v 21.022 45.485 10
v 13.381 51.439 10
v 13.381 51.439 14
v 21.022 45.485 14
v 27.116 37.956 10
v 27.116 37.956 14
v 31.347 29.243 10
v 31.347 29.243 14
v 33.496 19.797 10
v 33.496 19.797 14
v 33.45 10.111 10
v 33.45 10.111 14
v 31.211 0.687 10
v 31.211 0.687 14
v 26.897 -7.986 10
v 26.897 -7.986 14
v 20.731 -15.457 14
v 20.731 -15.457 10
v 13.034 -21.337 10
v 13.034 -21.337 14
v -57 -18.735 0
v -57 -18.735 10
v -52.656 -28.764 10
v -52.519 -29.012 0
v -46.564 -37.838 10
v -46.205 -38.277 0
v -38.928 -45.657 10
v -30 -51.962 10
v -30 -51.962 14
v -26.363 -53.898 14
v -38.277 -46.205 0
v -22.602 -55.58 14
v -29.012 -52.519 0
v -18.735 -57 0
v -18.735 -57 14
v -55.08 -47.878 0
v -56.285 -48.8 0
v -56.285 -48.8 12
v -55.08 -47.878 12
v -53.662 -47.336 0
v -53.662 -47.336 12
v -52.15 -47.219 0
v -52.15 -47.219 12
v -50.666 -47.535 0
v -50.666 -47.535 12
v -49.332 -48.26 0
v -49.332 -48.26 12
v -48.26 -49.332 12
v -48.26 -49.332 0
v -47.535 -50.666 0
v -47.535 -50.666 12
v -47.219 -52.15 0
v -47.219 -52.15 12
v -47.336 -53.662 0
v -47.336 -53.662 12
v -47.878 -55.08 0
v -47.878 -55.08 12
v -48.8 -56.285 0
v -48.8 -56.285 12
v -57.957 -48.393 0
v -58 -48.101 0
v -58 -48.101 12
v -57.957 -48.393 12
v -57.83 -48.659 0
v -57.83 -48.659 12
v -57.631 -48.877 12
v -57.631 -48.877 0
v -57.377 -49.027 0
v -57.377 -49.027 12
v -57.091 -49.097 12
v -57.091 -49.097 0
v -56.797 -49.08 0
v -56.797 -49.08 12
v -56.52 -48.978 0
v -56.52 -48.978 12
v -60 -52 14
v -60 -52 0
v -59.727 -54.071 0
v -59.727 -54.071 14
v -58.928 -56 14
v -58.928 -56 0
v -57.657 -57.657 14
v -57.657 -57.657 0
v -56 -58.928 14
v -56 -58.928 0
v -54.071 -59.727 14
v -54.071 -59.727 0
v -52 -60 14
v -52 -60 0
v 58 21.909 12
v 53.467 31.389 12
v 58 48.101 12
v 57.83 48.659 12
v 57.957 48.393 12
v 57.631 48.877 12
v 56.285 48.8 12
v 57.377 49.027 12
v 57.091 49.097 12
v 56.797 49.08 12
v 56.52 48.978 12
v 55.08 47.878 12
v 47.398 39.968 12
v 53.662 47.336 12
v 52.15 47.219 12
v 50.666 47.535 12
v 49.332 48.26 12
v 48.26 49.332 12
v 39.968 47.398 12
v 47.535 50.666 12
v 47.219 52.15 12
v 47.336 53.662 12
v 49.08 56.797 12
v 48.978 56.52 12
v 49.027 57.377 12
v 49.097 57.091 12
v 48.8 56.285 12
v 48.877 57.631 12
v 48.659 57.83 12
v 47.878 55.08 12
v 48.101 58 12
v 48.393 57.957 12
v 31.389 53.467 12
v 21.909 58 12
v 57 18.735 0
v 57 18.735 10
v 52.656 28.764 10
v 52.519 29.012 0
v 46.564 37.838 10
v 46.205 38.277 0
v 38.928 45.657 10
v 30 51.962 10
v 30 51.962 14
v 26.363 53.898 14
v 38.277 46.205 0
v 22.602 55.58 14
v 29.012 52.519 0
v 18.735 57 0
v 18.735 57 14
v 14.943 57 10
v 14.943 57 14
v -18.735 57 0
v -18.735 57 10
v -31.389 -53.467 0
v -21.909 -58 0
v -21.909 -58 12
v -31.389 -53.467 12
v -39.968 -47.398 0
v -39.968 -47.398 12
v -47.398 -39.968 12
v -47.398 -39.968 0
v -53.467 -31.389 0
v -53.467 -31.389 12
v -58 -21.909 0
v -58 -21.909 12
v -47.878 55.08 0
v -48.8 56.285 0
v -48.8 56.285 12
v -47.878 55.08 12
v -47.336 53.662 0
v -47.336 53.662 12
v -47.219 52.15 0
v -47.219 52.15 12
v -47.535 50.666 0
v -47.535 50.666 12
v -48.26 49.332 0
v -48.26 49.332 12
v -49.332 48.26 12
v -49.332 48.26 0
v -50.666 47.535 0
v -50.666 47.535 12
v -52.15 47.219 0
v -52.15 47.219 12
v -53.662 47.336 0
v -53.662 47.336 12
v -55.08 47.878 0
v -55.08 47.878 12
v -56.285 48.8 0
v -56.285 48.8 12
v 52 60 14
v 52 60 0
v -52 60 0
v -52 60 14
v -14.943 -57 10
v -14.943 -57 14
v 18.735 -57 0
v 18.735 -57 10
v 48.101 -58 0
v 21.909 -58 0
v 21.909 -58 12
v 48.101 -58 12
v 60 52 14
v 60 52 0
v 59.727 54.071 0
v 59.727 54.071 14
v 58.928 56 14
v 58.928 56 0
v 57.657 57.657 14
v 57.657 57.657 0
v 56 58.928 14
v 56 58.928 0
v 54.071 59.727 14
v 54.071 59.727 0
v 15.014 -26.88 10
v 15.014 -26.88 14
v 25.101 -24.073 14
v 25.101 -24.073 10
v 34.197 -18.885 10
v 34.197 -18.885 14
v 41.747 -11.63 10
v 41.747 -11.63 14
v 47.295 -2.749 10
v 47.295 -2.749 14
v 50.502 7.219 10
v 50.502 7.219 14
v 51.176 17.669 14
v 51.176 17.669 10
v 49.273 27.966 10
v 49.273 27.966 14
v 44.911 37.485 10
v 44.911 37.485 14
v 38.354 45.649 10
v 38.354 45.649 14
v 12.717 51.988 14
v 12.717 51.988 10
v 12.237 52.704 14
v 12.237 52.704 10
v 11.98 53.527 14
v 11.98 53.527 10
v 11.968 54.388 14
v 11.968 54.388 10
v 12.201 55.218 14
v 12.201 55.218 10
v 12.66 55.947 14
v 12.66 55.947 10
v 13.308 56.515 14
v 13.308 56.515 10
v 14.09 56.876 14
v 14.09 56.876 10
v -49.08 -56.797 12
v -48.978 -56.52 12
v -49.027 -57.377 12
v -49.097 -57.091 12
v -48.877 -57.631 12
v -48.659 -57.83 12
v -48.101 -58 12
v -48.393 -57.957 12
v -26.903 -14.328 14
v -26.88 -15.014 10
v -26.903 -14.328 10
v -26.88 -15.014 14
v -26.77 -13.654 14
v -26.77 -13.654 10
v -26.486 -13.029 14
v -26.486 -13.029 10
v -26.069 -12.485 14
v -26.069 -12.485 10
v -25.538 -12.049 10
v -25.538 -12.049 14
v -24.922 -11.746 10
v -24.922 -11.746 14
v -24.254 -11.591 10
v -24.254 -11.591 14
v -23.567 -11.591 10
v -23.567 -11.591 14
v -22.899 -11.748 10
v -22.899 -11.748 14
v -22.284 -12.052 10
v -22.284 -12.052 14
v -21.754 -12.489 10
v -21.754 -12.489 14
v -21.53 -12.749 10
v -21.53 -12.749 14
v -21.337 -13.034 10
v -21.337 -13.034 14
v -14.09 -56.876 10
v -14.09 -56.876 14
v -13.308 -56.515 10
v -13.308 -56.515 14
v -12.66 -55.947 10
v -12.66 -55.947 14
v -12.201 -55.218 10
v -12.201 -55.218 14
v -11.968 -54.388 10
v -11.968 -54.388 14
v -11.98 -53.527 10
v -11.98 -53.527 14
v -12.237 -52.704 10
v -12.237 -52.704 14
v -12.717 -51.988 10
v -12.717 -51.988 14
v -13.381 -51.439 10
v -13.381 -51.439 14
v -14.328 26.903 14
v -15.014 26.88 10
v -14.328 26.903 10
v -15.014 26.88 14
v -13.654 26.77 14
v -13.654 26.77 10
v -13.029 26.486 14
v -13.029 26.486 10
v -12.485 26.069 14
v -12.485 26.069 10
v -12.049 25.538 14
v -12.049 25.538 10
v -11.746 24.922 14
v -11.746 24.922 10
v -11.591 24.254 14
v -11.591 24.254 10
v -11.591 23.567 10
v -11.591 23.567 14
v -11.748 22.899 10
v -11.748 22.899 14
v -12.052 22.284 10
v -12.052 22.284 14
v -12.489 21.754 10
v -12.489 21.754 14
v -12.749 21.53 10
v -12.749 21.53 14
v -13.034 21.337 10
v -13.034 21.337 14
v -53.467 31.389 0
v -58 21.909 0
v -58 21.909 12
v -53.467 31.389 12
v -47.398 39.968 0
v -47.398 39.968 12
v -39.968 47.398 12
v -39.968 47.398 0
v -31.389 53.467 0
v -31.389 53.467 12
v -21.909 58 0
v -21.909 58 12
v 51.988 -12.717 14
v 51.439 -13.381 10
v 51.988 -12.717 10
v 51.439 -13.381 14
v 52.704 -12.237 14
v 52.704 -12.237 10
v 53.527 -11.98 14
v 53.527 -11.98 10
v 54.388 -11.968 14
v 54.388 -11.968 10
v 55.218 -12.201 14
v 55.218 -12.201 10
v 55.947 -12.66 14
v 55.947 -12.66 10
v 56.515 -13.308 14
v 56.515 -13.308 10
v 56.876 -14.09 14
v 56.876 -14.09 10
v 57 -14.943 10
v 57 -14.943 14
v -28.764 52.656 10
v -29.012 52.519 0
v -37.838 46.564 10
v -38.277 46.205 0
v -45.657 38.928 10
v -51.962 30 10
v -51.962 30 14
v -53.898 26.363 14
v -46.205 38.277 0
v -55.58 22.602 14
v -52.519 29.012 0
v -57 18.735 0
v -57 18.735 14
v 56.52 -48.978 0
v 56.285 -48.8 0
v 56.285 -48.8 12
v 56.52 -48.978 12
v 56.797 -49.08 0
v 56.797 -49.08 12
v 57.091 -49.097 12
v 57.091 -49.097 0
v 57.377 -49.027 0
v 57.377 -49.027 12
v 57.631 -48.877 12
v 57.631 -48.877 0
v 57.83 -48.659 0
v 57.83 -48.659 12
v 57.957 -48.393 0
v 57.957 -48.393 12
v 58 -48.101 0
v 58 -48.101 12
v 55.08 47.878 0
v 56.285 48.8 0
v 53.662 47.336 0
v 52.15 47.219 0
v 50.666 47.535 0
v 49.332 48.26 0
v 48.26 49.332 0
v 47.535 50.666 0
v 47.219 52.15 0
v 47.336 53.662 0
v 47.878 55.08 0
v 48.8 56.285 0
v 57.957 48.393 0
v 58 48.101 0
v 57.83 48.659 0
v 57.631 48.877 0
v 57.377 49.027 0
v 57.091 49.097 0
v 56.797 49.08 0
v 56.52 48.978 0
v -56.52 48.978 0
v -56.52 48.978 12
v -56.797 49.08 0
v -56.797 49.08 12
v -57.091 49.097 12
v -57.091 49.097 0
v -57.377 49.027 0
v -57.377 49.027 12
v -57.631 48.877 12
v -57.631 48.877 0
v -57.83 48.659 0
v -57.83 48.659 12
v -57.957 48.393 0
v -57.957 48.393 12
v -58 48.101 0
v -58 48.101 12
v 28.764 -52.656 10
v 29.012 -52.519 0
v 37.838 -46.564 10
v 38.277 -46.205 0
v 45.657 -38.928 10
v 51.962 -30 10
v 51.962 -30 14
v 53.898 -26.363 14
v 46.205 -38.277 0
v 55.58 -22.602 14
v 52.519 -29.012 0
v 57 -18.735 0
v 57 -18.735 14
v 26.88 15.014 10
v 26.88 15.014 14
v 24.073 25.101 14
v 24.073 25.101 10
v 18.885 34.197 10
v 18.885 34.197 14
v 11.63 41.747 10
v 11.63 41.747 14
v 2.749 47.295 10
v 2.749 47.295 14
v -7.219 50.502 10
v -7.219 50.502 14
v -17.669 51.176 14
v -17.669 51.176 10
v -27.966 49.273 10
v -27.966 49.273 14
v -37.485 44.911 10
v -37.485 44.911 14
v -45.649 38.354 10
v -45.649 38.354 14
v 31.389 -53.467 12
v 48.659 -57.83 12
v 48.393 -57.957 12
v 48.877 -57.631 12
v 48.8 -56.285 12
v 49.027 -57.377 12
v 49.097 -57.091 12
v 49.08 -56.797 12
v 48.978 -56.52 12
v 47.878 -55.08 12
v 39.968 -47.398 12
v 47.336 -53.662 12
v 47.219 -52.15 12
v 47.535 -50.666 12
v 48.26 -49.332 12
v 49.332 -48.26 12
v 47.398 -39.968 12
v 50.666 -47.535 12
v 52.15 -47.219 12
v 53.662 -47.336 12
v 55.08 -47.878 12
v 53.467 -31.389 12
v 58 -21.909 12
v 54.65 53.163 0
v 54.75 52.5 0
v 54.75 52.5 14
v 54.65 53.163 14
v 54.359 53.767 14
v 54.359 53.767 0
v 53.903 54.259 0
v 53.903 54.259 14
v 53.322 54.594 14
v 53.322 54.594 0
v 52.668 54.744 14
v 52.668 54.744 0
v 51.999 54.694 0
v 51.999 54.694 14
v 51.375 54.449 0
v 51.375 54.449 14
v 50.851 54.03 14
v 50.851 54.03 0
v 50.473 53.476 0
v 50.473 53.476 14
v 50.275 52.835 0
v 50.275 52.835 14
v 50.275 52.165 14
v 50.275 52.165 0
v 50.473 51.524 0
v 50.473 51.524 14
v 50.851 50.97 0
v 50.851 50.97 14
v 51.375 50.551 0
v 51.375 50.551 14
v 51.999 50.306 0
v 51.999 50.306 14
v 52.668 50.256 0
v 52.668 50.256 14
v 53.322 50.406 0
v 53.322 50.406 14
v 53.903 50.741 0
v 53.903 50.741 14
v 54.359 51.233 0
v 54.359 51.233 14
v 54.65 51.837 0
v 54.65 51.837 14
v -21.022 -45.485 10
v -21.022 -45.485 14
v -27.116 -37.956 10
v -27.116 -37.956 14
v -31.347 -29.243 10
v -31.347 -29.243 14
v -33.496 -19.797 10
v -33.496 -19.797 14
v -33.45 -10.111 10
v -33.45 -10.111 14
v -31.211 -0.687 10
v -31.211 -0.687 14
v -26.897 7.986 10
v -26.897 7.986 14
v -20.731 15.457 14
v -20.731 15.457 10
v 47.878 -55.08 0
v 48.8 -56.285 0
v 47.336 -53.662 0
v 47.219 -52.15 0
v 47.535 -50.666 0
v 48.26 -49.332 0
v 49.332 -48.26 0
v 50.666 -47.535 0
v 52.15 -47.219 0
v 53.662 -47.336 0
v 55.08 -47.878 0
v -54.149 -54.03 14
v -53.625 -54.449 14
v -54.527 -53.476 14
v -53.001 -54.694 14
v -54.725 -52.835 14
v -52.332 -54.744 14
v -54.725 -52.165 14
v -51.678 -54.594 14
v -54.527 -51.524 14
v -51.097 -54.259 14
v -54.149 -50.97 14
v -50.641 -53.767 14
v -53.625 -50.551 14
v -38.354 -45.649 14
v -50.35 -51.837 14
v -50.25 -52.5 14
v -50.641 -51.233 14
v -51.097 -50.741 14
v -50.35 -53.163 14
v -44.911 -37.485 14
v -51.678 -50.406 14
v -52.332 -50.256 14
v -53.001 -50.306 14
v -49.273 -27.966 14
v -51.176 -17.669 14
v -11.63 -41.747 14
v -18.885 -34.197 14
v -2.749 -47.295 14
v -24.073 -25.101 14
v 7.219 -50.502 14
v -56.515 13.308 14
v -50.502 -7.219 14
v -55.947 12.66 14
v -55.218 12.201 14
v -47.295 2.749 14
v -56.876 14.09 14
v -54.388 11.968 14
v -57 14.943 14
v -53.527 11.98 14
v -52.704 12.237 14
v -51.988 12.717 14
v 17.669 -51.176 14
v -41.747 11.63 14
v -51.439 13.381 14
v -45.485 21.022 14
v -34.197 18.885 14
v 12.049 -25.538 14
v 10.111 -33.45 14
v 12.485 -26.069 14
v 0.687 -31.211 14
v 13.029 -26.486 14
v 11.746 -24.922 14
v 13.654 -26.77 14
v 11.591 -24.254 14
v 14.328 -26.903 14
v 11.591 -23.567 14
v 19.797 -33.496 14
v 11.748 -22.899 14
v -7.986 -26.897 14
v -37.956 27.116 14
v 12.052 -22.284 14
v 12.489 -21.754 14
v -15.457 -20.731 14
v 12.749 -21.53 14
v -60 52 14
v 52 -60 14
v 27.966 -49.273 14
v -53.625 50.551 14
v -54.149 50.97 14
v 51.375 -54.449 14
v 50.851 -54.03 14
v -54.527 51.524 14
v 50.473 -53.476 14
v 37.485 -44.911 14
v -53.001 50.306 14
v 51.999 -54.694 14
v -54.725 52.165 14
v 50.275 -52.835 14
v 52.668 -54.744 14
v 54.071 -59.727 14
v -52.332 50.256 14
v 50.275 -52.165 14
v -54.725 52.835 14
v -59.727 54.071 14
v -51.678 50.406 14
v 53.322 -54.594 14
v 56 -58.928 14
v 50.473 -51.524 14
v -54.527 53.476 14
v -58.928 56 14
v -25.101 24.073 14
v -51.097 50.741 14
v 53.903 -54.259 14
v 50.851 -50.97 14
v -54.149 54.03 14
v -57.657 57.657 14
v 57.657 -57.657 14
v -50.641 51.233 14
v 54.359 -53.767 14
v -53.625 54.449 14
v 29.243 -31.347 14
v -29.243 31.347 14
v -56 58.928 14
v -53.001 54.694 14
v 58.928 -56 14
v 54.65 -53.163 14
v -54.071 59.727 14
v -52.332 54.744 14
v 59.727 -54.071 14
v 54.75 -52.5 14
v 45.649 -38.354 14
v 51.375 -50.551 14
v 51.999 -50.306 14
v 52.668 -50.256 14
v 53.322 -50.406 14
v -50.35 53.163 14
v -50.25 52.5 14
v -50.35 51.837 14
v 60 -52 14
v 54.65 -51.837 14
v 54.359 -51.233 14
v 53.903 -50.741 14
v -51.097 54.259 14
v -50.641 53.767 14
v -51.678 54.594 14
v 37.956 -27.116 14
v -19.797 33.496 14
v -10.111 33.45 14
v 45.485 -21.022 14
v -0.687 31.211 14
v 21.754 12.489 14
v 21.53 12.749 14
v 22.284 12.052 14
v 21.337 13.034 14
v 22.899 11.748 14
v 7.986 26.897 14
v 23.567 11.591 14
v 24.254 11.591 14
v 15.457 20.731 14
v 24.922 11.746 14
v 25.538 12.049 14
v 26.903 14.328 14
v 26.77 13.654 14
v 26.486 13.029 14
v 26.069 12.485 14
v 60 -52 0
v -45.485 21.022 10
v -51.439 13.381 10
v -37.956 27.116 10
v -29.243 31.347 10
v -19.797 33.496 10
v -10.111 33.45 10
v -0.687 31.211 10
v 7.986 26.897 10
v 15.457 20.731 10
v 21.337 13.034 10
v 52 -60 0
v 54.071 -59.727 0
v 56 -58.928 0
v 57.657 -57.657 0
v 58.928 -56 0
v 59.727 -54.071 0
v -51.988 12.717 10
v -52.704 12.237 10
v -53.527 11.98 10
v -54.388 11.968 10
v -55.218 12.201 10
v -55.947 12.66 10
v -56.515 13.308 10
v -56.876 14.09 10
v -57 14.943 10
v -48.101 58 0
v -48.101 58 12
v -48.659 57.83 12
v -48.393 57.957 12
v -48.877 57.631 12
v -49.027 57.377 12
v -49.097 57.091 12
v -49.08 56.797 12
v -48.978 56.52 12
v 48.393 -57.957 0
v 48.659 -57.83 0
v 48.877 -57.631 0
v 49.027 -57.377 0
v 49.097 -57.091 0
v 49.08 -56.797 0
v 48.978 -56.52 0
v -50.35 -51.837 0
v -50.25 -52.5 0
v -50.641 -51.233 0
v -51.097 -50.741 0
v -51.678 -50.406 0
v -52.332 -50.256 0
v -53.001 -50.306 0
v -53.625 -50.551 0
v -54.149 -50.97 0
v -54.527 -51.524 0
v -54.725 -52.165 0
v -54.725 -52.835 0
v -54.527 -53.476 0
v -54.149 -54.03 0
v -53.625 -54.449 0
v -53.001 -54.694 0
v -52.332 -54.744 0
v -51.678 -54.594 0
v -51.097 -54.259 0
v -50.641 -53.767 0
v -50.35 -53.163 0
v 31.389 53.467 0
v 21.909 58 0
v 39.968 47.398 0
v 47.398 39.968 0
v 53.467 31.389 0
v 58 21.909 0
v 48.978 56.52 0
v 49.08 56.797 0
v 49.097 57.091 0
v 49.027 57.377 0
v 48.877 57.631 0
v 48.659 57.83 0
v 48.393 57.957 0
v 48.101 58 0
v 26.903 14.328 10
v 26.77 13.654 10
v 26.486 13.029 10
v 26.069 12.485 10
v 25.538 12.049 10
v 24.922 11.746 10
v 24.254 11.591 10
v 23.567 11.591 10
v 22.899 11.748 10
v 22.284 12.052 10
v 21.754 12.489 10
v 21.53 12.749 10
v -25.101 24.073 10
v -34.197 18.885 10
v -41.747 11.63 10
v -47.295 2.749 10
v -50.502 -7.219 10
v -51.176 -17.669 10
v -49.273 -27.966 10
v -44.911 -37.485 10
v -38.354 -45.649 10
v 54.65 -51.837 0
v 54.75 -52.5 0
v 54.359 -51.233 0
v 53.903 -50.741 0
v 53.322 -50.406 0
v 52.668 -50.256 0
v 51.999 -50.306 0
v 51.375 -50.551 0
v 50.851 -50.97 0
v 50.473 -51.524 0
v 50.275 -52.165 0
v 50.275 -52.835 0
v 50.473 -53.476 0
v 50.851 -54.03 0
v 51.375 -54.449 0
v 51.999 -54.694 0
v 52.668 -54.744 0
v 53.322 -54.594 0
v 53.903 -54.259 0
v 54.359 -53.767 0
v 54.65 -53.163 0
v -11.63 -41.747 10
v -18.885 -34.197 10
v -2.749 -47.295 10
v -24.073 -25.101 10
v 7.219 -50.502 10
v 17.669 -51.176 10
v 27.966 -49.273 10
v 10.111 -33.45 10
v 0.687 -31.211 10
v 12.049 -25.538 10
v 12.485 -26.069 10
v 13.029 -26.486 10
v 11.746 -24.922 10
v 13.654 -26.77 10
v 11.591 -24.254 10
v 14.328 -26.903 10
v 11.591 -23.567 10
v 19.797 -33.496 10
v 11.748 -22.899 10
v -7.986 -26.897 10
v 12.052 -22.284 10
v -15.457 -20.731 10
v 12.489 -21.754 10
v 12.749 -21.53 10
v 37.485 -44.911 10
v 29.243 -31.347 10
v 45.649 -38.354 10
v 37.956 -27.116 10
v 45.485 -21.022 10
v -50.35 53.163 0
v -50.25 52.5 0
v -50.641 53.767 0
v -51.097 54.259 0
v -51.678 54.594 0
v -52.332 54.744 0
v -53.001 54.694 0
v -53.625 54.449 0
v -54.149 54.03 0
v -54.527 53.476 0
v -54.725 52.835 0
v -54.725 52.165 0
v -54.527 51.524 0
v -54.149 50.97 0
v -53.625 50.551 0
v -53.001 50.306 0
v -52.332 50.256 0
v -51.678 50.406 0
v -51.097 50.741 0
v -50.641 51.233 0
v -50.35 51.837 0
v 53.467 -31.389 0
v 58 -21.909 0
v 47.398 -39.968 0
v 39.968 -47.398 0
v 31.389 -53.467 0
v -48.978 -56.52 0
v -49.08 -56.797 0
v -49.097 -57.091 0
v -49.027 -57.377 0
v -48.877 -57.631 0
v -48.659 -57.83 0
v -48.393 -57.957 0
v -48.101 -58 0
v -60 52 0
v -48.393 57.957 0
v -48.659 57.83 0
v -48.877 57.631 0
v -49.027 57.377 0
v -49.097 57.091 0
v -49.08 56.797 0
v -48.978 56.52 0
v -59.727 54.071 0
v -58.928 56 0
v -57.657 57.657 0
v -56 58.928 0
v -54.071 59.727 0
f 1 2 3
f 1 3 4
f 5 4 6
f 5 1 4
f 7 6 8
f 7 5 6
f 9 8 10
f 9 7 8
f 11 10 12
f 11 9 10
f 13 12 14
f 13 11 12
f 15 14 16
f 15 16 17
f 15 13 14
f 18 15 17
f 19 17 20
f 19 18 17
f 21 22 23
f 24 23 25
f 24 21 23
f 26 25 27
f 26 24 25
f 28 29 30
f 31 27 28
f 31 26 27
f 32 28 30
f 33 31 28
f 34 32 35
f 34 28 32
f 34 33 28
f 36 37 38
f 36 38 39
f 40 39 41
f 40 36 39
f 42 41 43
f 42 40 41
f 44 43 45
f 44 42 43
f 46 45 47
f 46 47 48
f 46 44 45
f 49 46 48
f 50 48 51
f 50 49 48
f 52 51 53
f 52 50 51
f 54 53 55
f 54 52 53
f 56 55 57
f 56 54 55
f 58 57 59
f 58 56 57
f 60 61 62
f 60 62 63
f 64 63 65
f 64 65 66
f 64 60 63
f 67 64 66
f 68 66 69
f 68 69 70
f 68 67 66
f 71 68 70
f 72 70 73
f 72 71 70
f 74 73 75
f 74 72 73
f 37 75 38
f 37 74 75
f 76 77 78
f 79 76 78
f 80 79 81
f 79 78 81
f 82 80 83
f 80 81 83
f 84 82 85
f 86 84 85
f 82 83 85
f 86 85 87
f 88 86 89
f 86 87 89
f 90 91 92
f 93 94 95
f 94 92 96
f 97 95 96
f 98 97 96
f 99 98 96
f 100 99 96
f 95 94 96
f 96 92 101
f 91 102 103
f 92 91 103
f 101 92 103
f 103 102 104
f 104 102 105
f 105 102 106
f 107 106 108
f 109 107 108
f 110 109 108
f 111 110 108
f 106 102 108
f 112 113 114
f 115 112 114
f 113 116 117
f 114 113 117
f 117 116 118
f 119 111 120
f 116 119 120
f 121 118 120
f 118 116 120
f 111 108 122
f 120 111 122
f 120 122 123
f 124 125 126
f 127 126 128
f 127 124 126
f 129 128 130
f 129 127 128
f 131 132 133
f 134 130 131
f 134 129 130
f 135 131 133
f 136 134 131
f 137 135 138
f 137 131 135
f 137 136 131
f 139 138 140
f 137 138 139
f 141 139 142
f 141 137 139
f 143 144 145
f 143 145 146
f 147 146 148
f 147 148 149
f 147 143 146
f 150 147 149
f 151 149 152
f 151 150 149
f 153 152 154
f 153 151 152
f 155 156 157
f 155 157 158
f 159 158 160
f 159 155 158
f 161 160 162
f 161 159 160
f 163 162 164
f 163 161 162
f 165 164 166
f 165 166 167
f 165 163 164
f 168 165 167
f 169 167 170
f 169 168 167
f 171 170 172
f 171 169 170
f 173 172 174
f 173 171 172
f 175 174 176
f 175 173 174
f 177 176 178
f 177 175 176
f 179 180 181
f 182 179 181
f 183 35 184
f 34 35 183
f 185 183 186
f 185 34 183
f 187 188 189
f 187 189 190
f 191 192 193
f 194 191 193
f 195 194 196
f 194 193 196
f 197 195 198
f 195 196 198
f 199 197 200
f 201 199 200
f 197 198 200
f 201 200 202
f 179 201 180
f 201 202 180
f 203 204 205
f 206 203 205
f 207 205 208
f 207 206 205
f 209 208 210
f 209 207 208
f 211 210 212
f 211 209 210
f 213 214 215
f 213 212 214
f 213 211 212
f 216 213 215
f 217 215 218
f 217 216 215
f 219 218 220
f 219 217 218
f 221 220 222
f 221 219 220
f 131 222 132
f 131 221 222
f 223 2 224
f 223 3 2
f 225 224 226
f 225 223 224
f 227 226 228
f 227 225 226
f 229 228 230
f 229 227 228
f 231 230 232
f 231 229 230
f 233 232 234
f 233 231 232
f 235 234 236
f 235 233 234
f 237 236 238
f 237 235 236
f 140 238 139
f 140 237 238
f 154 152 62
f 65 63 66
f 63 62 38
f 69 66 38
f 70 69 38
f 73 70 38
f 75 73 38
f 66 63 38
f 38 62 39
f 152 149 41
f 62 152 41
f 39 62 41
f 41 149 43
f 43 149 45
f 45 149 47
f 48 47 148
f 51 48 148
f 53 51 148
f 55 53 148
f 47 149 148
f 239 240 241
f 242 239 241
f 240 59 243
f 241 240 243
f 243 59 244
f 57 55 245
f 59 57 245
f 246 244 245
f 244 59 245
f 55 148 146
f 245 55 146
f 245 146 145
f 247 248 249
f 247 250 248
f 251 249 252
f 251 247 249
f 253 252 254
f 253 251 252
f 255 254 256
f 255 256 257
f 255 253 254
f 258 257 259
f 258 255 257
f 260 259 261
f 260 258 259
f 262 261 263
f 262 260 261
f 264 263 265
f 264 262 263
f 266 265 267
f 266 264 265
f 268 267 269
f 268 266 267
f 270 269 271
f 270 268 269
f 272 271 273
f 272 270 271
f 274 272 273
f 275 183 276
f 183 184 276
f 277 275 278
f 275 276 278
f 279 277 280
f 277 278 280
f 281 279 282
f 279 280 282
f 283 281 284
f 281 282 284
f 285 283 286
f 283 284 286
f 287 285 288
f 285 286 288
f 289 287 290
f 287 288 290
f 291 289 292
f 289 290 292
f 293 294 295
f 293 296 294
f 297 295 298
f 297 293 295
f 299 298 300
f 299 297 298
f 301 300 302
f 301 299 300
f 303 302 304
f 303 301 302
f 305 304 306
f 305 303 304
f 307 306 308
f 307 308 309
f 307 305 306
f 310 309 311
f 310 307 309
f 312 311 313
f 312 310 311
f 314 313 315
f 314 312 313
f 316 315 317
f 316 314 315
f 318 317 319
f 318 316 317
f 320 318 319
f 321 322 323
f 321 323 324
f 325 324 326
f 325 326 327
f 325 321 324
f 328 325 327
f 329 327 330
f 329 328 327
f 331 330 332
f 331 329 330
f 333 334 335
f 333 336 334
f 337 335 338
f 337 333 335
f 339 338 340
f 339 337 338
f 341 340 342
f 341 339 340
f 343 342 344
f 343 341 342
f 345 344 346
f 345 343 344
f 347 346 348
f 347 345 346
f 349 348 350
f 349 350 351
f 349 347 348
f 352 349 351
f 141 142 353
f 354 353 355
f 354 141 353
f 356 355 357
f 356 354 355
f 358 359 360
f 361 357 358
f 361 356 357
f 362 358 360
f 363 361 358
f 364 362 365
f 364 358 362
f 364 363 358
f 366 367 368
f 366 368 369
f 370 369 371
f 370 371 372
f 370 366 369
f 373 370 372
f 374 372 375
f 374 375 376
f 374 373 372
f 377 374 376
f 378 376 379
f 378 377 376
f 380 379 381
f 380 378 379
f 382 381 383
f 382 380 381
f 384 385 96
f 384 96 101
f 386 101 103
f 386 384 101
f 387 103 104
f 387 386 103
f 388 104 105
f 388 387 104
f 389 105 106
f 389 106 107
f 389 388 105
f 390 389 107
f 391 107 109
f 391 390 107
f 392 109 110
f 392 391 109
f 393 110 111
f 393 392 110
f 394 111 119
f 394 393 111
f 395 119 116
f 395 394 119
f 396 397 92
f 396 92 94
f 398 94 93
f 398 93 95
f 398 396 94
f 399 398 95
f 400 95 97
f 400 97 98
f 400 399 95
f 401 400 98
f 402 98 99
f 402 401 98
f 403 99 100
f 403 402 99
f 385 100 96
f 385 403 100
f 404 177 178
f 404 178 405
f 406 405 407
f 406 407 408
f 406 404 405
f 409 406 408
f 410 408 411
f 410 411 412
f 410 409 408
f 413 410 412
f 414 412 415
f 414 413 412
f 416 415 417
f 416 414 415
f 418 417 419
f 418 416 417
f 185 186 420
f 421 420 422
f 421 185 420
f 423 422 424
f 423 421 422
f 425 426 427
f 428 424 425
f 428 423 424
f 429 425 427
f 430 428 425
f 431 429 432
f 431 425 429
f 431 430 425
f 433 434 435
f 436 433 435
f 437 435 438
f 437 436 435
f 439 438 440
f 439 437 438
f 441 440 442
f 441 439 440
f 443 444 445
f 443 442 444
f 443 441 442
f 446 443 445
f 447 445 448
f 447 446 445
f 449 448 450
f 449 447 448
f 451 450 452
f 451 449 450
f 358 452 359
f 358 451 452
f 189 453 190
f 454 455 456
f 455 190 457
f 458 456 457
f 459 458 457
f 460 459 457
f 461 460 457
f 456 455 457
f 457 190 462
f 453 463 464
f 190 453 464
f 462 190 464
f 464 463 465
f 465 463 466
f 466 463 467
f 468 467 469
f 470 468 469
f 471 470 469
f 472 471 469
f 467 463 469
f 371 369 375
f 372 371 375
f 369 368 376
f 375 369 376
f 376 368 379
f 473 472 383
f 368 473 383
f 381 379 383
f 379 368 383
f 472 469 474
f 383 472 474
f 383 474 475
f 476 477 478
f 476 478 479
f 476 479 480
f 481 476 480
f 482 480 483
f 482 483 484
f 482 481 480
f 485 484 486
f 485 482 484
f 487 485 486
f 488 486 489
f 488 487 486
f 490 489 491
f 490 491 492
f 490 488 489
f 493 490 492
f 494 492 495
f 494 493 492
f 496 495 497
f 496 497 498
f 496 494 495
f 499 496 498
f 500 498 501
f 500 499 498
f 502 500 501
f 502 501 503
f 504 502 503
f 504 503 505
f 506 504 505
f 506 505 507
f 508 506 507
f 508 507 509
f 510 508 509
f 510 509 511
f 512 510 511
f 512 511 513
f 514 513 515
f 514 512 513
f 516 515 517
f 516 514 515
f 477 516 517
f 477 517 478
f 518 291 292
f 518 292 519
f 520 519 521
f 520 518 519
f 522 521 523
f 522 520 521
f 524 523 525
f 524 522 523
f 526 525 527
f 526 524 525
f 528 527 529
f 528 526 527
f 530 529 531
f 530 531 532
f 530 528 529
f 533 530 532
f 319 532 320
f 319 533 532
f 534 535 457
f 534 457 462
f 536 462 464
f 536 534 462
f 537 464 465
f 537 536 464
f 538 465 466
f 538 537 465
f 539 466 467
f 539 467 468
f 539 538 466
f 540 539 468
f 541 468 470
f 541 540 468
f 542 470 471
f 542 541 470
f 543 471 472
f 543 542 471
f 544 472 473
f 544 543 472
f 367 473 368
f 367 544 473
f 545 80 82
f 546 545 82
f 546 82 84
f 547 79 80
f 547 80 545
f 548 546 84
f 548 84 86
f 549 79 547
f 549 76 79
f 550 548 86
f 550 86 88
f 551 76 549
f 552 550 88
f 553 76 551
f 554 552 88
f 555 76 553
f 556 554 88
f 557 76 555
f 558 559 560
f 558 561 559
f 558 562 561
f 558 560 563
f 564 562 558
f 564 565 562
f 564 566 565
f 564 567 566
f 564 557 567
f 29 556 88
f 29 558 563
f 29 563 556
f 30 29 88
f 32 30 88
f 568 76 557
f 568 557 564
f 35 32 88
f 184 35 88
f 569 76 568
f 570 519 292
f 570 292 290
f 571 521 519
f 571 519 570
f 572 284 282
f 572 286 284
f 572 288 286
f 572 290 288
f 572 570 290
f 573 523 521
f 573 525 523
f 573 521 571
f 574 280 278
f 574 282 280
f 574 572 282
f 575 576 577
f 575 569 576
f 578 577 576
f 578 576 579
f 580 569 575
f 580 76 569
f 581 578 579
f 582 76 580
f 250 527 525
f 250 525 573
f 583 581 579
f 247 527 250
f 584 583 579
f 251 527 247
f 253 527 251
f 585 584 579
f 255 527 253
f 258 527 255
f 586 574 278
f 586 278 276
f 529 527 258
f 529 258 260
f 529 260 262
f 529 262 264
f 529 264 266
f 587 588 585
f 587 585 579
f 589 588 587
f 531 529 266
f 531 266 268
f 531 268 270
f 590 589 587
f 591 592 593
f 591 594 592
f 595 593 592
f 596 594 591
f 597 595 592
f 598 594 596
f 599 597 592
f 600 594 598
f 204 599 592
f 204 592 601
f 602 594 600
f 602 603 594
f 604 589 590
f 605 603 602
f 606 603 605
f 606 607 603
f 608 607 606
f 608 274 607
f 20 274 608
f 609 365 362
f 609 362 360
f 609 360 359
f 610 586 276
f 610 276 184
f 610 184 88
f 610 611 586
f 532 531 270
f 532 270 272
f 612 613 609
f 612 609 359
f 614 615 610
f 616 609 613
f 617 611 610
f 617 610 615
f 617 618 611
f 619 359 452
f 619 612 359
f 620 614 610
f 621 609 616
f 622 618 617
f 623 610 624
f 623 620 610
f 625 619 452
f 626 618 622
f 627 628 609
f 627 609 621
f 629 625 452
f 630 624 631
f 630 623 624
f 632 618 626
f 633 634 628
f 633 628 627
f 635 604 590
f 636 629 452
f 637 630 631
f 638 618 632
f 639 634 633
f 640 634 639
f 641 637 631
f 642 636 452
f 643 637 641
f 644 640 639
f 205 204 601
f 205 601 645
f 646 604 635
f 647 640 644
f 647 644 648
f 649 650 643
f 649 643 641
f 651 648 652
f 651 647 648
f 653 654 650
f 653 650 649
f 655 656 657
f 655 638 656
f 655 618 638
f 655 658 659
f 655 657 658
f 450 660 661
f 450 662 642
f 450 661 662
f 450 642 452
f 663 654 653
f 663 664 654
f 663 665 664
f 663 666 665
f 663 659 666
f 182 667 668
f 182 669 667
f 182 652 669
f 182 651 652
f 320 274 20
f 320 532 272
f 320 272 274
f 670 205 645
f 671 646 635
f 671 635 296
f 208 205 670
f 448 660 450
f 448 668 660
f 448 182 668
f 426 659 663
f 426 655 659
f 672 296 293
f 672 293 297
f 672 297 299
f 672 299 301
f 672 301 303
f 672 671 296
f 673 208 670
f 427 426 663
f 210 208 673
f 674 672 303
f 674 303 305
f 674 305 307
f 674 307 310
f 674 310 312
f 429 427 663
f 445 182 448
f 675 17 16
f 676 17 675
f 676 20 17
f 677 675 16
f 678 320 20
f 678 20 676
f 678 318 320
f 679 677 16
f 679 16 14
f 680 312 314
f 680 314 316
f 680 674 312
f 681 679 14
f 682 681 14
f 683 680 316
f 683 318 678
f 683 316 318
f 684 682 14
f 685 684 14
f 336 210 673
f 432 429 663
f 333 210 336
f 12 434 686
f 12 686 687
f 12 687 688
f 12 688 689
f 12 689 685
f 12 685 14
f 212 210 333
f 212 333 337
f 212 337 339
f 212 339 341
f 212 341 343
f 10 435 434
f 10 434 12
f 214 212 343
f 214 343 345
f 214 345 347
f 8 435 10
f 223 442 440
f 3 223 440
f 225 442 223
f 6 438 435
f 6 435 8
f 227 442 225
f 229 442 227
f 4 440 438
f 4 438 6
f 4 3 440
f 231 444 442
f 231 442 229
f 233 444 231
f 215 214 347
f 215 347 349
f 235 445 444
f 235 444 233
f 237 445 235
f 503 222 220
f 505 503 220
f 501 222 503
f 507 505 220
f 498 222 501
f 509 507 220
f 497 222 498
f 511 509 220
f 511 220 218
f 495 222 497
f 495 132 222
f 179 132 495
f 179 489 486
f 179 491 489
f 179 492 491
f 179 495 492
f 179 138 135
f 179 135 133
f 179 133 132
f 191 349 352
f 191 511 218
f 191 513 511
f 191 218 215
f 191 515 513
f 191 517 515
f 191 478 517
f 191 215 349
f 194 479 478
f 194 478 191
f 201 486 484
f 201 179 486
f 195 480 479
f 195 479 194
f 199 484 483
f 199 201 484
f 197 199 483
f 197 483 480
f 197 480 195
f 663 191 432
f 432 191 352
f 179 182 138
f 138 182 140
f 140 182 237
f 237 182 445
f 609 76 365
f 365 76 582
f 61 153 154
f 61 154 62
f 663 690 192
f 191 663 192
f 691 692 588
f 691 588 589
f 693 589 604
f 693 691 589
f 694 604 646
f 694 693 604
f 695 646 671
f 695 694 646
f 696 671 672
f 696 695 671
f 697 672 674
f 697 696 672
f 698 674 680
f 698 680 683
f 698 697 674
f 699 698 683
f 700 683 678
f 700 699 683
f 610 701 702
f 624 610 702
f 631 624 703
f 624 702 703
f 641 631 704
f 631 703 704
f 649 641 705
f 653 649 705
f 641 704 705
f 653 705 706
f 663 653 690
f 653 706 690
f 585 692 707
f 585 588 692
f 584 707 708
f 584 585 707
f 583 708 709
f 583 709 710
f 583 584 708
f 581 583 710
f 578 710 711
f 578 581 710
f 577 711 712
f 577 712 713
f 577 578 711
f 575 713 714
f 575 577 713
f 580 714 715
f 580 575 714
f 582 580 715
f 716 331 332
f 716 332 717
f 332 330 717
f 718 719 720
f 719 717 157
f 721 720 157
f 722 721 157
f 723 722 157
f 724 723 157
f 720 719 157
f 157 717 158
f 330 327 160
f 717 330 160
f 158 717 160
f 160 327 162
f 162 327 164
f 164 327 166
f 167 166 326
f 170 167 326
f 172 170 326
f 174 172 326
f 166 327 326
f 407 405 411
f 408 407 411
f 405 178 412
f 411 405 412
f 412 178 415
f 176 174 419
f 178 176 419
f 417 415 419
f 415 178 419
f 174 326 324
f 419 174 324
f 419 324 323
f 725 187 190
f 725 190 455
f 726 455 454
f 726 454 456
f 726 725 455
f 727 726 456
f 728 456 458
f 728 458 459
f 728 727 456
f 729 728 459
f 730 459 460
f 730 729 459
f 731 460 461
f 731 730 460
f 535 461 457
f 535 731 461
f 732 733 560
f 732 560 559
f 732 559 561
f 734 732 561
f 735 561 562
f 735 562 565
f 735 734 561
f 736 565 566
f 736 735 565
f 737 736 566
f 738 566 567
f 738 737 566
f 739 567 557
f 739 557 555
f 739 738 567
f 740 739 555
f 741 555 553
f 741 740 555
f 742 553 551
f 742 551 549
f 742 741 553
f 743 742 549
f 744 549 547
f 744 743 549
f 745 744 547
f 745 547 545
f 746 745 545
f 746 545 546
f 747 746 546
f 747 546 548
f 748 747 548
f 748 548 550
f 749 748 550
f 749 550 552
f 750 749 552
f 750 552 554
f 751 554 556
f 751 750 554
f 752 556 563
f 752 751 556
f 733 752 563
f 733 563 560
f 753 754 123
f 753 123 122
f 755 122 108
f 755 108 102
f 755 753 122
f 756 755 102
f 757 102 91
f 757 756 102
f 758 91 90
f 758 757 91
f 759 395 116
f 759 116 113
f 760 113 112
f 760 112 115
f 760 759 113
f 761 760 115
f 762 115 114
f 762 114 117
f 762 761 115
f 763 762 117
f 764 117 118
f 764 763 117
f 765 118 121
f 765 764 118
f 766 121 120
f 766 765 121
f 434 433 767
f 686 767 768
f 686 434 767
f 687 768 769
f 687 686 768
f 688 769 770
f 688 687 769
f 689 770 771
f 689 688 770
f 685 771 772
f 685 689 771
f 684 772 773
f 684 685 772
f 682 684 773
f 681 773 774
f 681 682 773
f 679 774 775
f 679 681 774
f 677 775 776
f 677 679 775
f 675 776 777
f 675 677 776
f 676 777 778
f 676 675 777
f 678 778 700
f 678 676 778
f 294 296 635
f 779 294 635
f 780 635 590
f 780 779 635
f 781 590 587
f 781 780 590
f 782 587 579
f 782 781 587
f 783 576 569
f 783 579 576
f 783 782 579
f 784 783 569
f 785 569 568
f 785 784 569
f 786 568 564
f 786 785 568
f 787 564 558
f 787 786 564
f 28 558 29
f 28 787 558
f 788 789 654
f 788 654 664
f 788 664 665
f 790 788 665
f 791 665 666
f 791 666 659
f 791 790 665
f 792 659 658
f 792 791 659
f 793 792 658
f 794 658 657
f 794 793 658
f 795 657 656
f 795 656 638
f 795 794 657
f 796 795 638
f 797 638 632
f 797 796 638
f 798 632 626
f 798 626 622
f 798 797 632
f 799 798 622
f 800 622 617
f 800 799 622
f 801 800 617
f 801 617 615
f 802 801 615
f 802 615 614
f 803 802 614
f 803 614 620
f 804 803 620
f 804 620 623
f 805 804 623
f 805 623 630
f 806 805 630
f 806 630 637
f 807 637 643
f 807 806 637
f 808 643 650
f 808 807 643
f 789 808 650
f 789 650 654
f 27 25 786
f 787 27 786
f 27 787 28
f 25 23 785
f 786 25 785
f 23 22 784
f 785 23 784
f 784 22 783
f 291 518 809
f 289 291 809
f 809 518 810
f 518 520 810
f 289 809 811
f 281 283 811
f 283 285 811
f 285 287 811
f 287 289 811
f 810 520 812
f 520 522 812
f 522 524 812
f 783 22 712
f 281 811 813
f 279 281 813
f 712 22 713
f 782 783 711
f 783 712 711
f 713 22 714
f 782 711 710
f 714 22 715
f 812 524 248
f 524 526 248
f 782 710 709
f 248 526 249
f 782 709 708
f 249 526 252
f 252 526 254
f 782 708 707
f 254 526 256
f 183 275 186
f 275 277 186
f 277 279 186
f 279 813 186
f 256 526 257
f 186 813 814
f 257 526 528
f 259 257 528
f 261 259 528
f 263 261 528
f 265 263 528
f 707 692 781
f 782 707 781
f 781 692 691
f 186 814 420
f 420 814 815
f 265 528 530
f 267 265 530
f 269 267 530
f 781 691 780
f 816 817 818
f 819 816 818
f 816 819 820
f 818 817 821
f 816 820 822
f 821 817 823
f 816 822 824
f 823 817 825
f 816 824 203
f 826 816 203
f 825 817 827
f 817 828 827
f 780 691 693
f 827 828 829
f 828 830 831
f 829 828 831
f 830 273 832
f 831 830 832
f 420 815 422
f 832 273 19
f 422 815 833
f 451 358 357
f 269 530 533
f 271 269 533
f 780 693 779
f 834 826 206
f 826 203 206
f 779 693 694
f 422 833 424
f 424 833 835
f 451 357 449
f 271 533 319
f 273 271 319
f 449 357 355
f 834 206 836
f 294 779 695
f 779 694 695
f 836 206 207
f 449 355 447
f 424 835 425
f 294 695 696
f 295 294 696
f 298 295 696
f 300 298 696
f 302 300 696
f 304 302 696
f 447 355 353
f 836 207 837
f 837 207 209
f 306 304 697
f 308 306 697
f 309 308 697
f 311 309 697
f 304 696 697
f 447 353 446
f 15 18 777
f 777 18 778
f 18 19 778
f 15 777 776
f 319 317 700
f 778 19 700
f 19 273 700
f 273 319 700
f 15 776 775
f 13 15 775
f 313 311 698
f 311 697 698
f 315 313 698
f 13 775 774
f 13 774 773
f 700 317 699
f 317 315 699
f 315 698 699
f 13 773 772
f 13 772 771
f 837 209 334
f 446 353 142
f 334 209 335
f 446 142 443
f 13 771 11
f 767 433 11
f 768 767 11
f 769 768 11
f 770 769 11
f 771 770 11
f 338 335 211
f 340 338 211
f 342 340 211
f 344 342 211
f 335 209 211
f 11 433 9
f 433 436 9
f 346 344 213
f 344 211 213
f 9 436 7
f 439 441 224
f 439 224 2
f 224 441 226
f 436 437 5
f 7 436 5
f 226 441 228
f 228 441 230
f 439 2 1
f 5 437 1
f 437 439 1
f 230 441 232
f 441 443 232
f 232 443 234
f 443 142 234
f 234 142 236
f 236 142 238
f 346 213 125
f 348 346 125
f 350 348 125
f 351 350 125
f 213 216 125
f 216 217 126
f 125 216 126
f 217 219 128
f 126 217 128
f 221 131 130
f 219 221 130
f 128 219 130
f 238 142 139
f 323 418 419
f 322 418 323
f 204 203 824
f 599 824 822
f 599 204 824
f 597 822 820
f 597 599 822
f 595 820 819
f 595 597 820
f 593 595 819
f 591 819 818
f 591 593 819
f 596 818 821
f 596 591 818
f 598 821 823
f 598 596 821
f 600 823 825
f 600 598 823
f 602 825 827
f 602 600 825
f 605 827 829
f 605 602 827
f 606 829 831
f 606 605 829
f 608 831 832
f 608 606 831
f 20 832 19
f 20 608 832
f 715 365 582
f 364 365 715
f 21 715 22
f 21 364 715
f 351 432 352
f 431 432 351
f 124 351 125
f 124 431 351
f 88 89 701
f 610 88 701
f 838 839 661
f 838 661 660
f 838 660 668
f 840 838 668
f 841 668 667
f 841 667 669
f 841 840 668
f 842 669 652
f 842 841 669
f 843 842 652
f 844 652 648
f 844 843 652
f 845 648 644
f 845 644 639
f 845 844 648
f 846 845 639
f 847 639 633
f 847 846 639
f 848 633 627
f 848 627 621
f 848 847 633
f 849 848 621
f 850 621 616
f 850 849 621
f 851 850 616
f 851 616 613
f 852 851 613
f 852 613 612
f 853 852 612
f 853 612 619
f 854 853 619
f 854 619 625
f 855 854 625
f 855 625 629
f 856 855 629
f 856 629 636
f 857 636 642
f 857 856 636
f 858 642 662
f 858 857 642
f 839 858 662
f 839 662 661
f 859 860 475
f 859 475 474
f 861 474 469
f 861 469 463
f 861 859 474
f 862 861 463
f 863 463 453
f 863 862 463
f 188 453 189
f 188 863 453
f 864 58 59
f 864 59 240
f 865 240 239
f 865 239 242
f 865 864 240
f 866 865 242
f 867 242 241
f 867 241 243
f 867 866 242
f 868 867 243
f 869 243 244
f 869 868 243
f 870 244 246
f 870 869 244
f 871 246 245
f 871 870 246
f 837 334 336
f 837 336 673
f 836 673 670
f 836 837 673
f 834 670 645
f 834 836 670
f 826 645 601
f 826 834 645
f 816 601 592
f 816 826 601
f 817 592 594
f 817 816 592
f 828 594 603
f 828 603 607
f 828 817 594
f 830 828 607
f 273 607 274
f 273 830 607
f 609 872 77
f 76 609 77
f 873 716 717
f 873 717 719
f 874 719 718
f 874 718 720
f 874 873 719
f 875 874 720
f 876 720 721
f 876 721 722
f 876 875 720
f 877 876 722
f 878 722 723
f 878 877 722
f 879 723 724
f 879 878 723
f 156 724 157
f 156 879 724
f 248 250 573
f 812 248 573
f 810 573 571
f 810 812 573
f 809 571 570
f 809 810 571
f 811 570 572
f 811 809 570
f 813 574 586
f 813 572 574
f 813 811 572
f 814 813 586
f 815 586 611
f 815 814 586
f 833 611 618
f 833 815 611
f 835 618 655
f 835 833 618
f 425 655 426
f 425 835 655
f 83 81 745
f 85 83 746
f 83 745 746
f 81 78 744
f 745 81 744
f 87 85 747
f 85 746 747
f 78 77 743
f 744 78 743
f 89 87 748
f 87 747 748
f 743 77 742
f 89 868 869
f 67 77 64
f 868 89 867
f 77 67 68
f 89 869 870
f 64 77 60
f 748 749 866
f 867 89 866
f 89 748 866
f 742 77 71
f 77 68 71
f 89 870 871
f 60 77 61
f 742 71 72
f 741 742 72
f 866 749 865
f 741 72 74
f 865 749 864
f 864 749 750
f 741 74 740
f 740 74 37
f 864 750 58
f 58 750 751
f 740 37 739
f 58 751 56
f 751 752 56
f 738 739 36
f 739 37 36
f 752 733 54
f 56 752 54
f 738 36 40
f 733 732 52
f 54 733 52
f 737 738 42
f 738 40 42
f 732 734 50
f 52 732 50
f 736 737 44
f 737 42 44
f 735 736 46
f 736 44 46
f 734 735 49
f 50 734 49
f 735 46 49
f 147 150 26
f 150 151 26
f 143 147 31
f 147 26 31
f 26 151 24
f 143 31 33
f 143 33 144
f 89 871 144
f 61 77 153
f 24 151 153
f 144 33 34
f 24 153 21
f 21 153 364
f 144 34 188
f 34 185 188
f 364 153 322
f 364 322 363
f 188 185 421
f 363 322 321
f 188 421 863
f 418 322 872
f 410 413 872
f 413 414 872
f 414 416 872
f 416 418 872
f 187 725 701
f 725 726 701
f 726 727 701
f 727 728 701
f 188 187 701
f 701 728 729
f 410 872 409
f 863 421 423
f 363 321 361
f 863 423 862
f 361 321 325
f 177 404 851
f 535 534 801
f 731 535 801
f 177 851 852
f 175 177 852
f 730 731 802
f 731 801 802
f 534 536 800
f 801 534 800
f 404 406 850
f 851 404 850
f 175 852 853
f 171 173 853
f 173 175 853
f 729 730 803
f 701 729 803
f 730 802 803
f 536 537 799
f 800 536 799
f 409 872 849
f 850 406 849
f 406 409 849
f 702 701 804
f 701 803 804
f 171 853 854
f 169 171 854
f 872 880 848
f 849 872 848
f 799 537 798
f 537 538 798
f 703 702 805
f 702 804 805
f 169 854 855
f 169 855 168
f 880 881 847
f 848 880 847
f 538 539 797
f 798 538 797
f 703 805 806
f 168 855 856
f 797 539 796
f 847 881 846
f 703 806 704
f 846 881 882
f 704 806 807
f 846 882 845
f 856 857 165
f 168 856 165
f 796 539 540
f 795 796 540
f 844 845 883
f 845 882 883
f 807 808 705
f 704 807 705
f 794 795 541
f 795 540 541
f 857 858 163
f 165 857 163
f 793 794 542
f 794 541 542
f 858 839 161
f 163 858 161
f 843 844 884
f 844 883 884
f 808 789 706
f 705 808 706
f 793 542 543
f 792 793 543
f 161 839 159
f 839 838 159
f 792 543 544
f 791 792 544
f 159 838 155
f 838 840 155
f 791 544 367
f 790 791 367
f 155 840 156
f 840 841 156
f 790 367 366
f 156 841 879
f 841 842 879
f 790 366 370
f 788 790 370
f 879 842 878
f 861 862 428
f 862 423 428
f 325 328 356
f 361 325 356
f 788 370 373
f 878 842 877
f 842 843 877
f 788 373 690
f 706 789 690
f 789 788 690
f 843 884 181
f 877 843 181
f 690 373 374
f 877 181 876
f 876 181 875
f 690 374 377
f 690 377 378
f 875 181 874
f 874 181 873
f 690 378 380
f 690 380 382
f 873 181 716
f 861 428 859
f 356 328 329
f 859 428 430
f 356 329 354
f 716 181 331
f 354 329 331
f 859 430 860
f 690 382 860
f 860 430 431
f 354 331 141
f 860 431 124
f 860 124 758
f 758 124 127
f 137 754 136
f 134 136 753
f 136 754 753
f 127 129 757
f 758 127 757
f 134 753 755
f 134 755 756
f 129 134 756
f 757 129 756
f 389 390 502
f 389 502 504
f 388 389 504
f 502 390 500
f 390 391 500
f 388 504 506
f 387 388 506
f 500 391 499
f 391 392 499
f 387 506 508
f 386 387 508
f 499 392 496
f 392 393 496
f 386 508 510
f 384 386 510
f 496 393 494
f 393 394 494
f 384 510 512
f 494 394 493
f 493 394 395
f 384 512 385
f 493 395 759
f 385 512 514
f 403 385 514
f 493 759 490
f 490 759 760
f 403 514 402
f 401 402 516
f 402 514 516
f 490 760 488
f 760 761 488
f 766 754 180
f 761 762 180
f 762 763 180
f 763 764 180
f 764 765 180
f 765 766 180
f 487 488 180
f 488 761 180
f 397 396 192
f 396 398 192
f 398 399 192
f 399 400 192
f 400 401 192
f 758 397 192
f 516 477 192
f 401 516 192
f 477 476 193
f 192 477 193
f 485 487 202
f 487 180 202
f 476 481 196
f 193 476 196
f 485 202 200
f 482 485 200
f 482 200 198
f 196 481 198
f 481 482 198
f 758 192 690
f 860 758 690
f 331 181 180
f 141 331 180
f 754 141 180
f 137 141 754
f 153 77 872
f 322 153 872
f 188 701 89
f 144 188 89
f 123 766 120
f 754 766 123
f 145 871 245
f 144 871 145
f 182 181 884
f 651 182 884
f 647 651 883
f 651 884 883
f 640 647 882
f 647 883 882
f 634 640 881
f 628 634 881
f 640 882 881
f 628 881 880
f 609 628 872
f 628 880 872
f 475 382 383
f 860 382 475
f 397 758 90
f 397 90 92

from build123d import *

# Parameters (mm, degrees)
F0_R            = 25
F0_R_2          = 2.25
F1_DEPTH        = 14
F2_DEPTH        = 10
F4_DEPTH        = 14.001
F5_R            = 3
F7_DEPTH        = 12
F7_COPIES_COUNT = 4


# Not quite as in the source:
# - a pattern or mirror of a feature is missing from the dataset's text; its kind, count and spacing are read off the source's solid


with BuildPart() as f1:
    # F0 (on Top) → F1 (new body)
    with BuildSketch(Plane.XY):
        with BuildLine():
            ThreePointArc((57, 18.7349939952), (42.4264068712, 42.4264068712), (18.7349939952, 57))
            Line((18.7349939952, 57), (-18.7349939952, 57))
            ThreePointArc((-18.7349939952, 57), (-42.4264068712, 42.4264068712), (-57, 18.7349939952))
            Line((-57, 18.7349939952), (-57, -18.7349939952))
            ThreePointArc((-57, -18.7349939952), (-42.4264068712, -42.4264068712), (-18.7349939952, -57))
            Line((-18.7349939952, -57), (18.7349939952, -57))
            ThreePointArc((18.7349939952, -57), (42.4264068712, -42.4264068712), (57, -18.7349939952))
            Line((57, -18.7349939952), (57, 18.7349939952))
        make_face()
        Circle(F0_R, mode=Mode.SUBTRACT)
        Circle(F0_R)
        with BuildLine():
            ThreePointArc((-18.7349939952, 57), (-9.486832838, 59.2452529972), (2.885e-07, 60))
            Line((2.885e-07, 60), (-52, 60))
            ThreePointArc((-52, 60), (-57.6568542495, 57.6568542495), (-60, 52))
            Line((-60, 52), (-60, 2.895e-07))
            ThreePointArc((-60, 2.895e-07), (-59.2452529515, 9.4868331234), (-57, 18.7349939952))
            ThreePointArc((-57, 18.7349939952), (-42.4264068712, 42.4264068712), (-18.7349939952, 57))
        make_face()
        with Locations((-52.5, 52.5)):
            Circle(F0_R_2, mode=Mode.SUBTRACT)
        with BuildLine():
            ThreePointArc((-57, -18.7349939952), (-59.2452529973, -9.4868328376), (-60, 2.895e-07))
            Line((-60, 2.895e-07), (-60, -52))
            ThreePointArc((-60, -52), (-57.6568542495, -57.6568542495), (-52, -60))
            Line((-52, -60), (-2.57e-07, -60))
            ThreePointArc((-2.57e-07, -60), (-9.4868331074, -59.2452529541), (-18.7349939952, -57))
            ThreePointArc((-18.7349939952, -57), (-42.4264068712, -42.4264068712), (-57, -18.7349939952))
        make_face()
        with Locations((-52.5, -52.5)):
            Circle(F0_R_2, mode=Mode.SUBTRACT)
        with BuildLine():
            Line((60, -52), (60, 0))
            ThreePointArc((60, 0), (59.2452529744, -9.4868329805), (57, -18.7349939952))
            ThreePointArc((57, -18.7349939952), (42.4264068712, -42.4264068712), (18.7349939952, -57))
            ThreePointArc((18.7349939952, -57), (9.4868328536, -59.2452529947), (-2.57e-07, -60))
            Line((-2.57e-07, -60), (52, -60))
            ThreePointArc((52, -60), (57.6568542495, -57.6568542495), (60, -52))
        make_face()
        with Locations((52.5, -52.5)):
            Circle(F0_R_2, mode=Mode.SUBTRACT)
        with BuildLine():
            ThreePointArc((60, 52), (57.6568542495, 57.6568542495), (52, 60))
            Line((52, 60), (2.885e-07, 60))
            ThreePointArc((2.885e-07, 60), (9.486833123, 59.2452529516), (18.7349939952, 57))
            ThreePointArc((18.7349939952, 57), (42.4264068712, 42.4264068712), (57, 18.7349939952))
            ThreePointArc((57, 18.7349939952), (59.2452529744, 9.4868329805), (60, 0))
            Line((60, 0), (60, 52))
        make_face()
        with Locations((52.5, 52.5)):
            Circle(F0_R_2, mode=Mode.SUBTRACT)
        with BuildLine():
            ThreePointArc((18.7349939952, 57), (9.486833123, 59.2452529516), (2.885e-07, 60))
            ThreePointArc((2.885e-07, 60), (-9.486832838, 59.2452529972), (-18.7349939952, 57))
            Line((-18.7349939952, 57), (18.7349939952, 57))
        make_face()
        with BuildLine():
            Line((-57, -18.7349939952), (-57, 18.7349939952))
            ThreePointArc((-57, 18.7349939952), (-59.2452529515, 9.4868331234), (-60, 2.895e-07))
            ThreePointArc((-60, 2.895e-07), (-59.2452529973, -9.4868328376), (-57, -18.7349939952))
        make_face()
        with BuildLine():
            ThreePointArc((-2.57e-07, -60), (9.4868328536, -59.2452529947), (18.7349939952, -57))
            Line((18.7349939952, -57), (-18.7349939952, -57))
            ThreePointArc((-18.7349939952, -57), (-9.4868331074, -59.2452529541), (-2.57e-07, -60))
        make_face()
        with BuildLine():
            ThreePointArc((57, -18.7349939952), (59.2452529744, -9.4868329805), (60, 0))
            ThreePointArc((60, 0), (59.2452529744, 9.4868329805), (57, 18.7349939952))
            Line((57, 18.7349939952), (57, -18.7349939952))
        make_face()
    extrude(amount=F1_DEPTH)

    # F0 (on Top) → F2 (cut)
    with BuildSketch(Plane.XY):
        with BuildLine():
            ThreePointArc((57, 18.7349939952), (42.4264068712, 42.4264068712), (18.7349939952, 57))
            Line((18.7349939952, 57), (-18.7349939952, 57))
            ThreePointArc((-18.7349939952, 57), (-42.4264068712, 42.4264068712), (-57, 18.7349939952))
            Line((-57, 18.7349939952), (-57, -18.7349939952))
            ThreePointArc((-57, -18.7349939952), (-42.4264068712, -42.4264068712), (-18.7349939952, -57))
            Line((-18.7349939952, -57), (18.7349939952, -57))
            ThreePointArc((18.7349939952, -57), (42.4264068712, -42.4264068712), (57, -18.7349939952))
            Line((57, -18.7349939952), (57, 18.7349939952))
        make_face()
        Circle(F0_R, mode=Mode.SUBTRACT)
        Circle(F0_R)
    extrude(amount=F2_DEPTH, mode=Mode.SUBTRACT)

    # F3 (on face) → F4 (cut, through all)
    with BuildSketch(Plane.XY):
        with BuildLine():
            ThreePointArc((51.9615242271, -30), (54.7711468799, -24.4973767873), (57, -18.7349939952))
            Line((57, -18.7349939952), (57, 1.314733996))
            ThreePointArc((57, 1.314733996), (22.5078780664, -33.1091892137), (-21.6506350946, -12.5))
            ThreePointArc((-21.6506350946, -12.5), (-25, 0), (-21.6506350946, 12.5))
            ThreePointArc((-21.6506350946, 12.5), (-6.0945554338, -45.5560796608), (51.9615242271, -30))
        make_face()
        with BuildLine():
            Line((-18.7349939952, -57), (1.314733996, -57))
            ThreePointArc((1.314733996, -57), (-33.1091892137, -22.5078780664), (-12.5, 21.6506350946))
            ThreePointArc((-12.5, 21.6506350946), (0, 25), (12.5, 21.6506350946))
            ThreePointArc((12.5, 21.6506350946), (-45.5560796608, 6.0945554338), (-30, -51.9615242271))
            ThreePointArc((-30, -51.9615242271), (-24.4973767873, -54.7711468799), (-18.7349939952, -57))
        make_face()
        with BuildLine():
            ThreePointArc((-12.5, -21.6506350946), (45.5560796608, -6.0945554338), (30, 51.9615242271))
            ThreePointArc((30, 51.9615242271), (24.4973767873, 54.7711468799), (18.7349939952, 57))
            Line((18.7349939952, 57), (-1.314733996, 57))
            ThreePointArc((-1.314733996, 57), (33.1091892137, 22.5078780664), (12.5, -21.6506350946))
            ThreePointArc((12.5, -21.6506350946), (0, -25), (-12.5, -21.6506350946))
        make_face()
        with BuildLine():
            ThreePointArc((25, 0), (24.1481456572, -6.4704761276), (21.6506350946, -12.5))
            ThreePointArc((21.6506350946, -12.5), (6.0945554338, 45.5560796608), (-51.9615242271, 30))
            ThreePointArc((-51.9615242271, 30), (-54.7711468799, 24.4973767873), (-57, 18.7349939952))
            Line((-57, 18.7349939952), (-57, -1.314733996))
            ThreePointArc((-57, -1.314733996), (-22.5078780664, 33.1091892137), (21.6506350946, 12.5))
            ThreePointArc((21.6506350946, 12.5), (24.1481456572, 6.4704761276), (25, 0))
        make_face()
    extrude(amount=F4_DEPTH, mode=Mode.SUBTRACT)

    # F5
    f5_edges = [f1.edges().sort_by_distance(p)[0] for p in [
        (21.650635, -12.5, 12),
        (12.5, 21.650635, 12),
        (-21.650635, 12.5, 12),
        (-12.5, -21.650635, 12),
        (-57, -1.314734, 12),
        (-1.314734, 57, 12),
        (57, 1.314734, 12),
        (1.314734, -57, 12),
    ]]
    fillet(f5_edges, radius=F5_R)

    # F6 (on face) → F7 (cut)
    with BuildSketch(Plane.XY):
        with BuildLine():
            ThreePointArc((58, -21.9089023002), (43.8406204336, -43.8406204336), (21.9089023002, -58))
            Line((21.9089023002, -58), (48.1010791024, -58))
            ThreePointArc((48.1010791024, -58), (49.0271170017, -57.3774305355), (48.8001090628, -56.2849076182))
            ThreePointArc((48.8001090628, -56.2849076182), (48.7573593129, -48.7573593129), (56.2849076182, -48.8001090628))
            ThreePointArc((56.2849076182, -48.8001090628), (57.3774305355, -49.0271170017), (58, -48.1010791024))
            Line((58, -48.1010791024), (58, -21.9089023002))
        make_face()
    f7 = extrude(amount=F7_DEPTH, mode=Mode.SUBTRACT)

    # F7_copies: F7 ×4 about axis
    f7_copies_axis = Axis((0, 0, 0), (0, 0, 1))
    for i in range(1, F7_COPIES_COUNT):
        add(f7.rotate(f7_copies_axis, i * 360 / F7_COPIES_COUNT), mode=Mode.SUBTRACT)


solid = f1.part
